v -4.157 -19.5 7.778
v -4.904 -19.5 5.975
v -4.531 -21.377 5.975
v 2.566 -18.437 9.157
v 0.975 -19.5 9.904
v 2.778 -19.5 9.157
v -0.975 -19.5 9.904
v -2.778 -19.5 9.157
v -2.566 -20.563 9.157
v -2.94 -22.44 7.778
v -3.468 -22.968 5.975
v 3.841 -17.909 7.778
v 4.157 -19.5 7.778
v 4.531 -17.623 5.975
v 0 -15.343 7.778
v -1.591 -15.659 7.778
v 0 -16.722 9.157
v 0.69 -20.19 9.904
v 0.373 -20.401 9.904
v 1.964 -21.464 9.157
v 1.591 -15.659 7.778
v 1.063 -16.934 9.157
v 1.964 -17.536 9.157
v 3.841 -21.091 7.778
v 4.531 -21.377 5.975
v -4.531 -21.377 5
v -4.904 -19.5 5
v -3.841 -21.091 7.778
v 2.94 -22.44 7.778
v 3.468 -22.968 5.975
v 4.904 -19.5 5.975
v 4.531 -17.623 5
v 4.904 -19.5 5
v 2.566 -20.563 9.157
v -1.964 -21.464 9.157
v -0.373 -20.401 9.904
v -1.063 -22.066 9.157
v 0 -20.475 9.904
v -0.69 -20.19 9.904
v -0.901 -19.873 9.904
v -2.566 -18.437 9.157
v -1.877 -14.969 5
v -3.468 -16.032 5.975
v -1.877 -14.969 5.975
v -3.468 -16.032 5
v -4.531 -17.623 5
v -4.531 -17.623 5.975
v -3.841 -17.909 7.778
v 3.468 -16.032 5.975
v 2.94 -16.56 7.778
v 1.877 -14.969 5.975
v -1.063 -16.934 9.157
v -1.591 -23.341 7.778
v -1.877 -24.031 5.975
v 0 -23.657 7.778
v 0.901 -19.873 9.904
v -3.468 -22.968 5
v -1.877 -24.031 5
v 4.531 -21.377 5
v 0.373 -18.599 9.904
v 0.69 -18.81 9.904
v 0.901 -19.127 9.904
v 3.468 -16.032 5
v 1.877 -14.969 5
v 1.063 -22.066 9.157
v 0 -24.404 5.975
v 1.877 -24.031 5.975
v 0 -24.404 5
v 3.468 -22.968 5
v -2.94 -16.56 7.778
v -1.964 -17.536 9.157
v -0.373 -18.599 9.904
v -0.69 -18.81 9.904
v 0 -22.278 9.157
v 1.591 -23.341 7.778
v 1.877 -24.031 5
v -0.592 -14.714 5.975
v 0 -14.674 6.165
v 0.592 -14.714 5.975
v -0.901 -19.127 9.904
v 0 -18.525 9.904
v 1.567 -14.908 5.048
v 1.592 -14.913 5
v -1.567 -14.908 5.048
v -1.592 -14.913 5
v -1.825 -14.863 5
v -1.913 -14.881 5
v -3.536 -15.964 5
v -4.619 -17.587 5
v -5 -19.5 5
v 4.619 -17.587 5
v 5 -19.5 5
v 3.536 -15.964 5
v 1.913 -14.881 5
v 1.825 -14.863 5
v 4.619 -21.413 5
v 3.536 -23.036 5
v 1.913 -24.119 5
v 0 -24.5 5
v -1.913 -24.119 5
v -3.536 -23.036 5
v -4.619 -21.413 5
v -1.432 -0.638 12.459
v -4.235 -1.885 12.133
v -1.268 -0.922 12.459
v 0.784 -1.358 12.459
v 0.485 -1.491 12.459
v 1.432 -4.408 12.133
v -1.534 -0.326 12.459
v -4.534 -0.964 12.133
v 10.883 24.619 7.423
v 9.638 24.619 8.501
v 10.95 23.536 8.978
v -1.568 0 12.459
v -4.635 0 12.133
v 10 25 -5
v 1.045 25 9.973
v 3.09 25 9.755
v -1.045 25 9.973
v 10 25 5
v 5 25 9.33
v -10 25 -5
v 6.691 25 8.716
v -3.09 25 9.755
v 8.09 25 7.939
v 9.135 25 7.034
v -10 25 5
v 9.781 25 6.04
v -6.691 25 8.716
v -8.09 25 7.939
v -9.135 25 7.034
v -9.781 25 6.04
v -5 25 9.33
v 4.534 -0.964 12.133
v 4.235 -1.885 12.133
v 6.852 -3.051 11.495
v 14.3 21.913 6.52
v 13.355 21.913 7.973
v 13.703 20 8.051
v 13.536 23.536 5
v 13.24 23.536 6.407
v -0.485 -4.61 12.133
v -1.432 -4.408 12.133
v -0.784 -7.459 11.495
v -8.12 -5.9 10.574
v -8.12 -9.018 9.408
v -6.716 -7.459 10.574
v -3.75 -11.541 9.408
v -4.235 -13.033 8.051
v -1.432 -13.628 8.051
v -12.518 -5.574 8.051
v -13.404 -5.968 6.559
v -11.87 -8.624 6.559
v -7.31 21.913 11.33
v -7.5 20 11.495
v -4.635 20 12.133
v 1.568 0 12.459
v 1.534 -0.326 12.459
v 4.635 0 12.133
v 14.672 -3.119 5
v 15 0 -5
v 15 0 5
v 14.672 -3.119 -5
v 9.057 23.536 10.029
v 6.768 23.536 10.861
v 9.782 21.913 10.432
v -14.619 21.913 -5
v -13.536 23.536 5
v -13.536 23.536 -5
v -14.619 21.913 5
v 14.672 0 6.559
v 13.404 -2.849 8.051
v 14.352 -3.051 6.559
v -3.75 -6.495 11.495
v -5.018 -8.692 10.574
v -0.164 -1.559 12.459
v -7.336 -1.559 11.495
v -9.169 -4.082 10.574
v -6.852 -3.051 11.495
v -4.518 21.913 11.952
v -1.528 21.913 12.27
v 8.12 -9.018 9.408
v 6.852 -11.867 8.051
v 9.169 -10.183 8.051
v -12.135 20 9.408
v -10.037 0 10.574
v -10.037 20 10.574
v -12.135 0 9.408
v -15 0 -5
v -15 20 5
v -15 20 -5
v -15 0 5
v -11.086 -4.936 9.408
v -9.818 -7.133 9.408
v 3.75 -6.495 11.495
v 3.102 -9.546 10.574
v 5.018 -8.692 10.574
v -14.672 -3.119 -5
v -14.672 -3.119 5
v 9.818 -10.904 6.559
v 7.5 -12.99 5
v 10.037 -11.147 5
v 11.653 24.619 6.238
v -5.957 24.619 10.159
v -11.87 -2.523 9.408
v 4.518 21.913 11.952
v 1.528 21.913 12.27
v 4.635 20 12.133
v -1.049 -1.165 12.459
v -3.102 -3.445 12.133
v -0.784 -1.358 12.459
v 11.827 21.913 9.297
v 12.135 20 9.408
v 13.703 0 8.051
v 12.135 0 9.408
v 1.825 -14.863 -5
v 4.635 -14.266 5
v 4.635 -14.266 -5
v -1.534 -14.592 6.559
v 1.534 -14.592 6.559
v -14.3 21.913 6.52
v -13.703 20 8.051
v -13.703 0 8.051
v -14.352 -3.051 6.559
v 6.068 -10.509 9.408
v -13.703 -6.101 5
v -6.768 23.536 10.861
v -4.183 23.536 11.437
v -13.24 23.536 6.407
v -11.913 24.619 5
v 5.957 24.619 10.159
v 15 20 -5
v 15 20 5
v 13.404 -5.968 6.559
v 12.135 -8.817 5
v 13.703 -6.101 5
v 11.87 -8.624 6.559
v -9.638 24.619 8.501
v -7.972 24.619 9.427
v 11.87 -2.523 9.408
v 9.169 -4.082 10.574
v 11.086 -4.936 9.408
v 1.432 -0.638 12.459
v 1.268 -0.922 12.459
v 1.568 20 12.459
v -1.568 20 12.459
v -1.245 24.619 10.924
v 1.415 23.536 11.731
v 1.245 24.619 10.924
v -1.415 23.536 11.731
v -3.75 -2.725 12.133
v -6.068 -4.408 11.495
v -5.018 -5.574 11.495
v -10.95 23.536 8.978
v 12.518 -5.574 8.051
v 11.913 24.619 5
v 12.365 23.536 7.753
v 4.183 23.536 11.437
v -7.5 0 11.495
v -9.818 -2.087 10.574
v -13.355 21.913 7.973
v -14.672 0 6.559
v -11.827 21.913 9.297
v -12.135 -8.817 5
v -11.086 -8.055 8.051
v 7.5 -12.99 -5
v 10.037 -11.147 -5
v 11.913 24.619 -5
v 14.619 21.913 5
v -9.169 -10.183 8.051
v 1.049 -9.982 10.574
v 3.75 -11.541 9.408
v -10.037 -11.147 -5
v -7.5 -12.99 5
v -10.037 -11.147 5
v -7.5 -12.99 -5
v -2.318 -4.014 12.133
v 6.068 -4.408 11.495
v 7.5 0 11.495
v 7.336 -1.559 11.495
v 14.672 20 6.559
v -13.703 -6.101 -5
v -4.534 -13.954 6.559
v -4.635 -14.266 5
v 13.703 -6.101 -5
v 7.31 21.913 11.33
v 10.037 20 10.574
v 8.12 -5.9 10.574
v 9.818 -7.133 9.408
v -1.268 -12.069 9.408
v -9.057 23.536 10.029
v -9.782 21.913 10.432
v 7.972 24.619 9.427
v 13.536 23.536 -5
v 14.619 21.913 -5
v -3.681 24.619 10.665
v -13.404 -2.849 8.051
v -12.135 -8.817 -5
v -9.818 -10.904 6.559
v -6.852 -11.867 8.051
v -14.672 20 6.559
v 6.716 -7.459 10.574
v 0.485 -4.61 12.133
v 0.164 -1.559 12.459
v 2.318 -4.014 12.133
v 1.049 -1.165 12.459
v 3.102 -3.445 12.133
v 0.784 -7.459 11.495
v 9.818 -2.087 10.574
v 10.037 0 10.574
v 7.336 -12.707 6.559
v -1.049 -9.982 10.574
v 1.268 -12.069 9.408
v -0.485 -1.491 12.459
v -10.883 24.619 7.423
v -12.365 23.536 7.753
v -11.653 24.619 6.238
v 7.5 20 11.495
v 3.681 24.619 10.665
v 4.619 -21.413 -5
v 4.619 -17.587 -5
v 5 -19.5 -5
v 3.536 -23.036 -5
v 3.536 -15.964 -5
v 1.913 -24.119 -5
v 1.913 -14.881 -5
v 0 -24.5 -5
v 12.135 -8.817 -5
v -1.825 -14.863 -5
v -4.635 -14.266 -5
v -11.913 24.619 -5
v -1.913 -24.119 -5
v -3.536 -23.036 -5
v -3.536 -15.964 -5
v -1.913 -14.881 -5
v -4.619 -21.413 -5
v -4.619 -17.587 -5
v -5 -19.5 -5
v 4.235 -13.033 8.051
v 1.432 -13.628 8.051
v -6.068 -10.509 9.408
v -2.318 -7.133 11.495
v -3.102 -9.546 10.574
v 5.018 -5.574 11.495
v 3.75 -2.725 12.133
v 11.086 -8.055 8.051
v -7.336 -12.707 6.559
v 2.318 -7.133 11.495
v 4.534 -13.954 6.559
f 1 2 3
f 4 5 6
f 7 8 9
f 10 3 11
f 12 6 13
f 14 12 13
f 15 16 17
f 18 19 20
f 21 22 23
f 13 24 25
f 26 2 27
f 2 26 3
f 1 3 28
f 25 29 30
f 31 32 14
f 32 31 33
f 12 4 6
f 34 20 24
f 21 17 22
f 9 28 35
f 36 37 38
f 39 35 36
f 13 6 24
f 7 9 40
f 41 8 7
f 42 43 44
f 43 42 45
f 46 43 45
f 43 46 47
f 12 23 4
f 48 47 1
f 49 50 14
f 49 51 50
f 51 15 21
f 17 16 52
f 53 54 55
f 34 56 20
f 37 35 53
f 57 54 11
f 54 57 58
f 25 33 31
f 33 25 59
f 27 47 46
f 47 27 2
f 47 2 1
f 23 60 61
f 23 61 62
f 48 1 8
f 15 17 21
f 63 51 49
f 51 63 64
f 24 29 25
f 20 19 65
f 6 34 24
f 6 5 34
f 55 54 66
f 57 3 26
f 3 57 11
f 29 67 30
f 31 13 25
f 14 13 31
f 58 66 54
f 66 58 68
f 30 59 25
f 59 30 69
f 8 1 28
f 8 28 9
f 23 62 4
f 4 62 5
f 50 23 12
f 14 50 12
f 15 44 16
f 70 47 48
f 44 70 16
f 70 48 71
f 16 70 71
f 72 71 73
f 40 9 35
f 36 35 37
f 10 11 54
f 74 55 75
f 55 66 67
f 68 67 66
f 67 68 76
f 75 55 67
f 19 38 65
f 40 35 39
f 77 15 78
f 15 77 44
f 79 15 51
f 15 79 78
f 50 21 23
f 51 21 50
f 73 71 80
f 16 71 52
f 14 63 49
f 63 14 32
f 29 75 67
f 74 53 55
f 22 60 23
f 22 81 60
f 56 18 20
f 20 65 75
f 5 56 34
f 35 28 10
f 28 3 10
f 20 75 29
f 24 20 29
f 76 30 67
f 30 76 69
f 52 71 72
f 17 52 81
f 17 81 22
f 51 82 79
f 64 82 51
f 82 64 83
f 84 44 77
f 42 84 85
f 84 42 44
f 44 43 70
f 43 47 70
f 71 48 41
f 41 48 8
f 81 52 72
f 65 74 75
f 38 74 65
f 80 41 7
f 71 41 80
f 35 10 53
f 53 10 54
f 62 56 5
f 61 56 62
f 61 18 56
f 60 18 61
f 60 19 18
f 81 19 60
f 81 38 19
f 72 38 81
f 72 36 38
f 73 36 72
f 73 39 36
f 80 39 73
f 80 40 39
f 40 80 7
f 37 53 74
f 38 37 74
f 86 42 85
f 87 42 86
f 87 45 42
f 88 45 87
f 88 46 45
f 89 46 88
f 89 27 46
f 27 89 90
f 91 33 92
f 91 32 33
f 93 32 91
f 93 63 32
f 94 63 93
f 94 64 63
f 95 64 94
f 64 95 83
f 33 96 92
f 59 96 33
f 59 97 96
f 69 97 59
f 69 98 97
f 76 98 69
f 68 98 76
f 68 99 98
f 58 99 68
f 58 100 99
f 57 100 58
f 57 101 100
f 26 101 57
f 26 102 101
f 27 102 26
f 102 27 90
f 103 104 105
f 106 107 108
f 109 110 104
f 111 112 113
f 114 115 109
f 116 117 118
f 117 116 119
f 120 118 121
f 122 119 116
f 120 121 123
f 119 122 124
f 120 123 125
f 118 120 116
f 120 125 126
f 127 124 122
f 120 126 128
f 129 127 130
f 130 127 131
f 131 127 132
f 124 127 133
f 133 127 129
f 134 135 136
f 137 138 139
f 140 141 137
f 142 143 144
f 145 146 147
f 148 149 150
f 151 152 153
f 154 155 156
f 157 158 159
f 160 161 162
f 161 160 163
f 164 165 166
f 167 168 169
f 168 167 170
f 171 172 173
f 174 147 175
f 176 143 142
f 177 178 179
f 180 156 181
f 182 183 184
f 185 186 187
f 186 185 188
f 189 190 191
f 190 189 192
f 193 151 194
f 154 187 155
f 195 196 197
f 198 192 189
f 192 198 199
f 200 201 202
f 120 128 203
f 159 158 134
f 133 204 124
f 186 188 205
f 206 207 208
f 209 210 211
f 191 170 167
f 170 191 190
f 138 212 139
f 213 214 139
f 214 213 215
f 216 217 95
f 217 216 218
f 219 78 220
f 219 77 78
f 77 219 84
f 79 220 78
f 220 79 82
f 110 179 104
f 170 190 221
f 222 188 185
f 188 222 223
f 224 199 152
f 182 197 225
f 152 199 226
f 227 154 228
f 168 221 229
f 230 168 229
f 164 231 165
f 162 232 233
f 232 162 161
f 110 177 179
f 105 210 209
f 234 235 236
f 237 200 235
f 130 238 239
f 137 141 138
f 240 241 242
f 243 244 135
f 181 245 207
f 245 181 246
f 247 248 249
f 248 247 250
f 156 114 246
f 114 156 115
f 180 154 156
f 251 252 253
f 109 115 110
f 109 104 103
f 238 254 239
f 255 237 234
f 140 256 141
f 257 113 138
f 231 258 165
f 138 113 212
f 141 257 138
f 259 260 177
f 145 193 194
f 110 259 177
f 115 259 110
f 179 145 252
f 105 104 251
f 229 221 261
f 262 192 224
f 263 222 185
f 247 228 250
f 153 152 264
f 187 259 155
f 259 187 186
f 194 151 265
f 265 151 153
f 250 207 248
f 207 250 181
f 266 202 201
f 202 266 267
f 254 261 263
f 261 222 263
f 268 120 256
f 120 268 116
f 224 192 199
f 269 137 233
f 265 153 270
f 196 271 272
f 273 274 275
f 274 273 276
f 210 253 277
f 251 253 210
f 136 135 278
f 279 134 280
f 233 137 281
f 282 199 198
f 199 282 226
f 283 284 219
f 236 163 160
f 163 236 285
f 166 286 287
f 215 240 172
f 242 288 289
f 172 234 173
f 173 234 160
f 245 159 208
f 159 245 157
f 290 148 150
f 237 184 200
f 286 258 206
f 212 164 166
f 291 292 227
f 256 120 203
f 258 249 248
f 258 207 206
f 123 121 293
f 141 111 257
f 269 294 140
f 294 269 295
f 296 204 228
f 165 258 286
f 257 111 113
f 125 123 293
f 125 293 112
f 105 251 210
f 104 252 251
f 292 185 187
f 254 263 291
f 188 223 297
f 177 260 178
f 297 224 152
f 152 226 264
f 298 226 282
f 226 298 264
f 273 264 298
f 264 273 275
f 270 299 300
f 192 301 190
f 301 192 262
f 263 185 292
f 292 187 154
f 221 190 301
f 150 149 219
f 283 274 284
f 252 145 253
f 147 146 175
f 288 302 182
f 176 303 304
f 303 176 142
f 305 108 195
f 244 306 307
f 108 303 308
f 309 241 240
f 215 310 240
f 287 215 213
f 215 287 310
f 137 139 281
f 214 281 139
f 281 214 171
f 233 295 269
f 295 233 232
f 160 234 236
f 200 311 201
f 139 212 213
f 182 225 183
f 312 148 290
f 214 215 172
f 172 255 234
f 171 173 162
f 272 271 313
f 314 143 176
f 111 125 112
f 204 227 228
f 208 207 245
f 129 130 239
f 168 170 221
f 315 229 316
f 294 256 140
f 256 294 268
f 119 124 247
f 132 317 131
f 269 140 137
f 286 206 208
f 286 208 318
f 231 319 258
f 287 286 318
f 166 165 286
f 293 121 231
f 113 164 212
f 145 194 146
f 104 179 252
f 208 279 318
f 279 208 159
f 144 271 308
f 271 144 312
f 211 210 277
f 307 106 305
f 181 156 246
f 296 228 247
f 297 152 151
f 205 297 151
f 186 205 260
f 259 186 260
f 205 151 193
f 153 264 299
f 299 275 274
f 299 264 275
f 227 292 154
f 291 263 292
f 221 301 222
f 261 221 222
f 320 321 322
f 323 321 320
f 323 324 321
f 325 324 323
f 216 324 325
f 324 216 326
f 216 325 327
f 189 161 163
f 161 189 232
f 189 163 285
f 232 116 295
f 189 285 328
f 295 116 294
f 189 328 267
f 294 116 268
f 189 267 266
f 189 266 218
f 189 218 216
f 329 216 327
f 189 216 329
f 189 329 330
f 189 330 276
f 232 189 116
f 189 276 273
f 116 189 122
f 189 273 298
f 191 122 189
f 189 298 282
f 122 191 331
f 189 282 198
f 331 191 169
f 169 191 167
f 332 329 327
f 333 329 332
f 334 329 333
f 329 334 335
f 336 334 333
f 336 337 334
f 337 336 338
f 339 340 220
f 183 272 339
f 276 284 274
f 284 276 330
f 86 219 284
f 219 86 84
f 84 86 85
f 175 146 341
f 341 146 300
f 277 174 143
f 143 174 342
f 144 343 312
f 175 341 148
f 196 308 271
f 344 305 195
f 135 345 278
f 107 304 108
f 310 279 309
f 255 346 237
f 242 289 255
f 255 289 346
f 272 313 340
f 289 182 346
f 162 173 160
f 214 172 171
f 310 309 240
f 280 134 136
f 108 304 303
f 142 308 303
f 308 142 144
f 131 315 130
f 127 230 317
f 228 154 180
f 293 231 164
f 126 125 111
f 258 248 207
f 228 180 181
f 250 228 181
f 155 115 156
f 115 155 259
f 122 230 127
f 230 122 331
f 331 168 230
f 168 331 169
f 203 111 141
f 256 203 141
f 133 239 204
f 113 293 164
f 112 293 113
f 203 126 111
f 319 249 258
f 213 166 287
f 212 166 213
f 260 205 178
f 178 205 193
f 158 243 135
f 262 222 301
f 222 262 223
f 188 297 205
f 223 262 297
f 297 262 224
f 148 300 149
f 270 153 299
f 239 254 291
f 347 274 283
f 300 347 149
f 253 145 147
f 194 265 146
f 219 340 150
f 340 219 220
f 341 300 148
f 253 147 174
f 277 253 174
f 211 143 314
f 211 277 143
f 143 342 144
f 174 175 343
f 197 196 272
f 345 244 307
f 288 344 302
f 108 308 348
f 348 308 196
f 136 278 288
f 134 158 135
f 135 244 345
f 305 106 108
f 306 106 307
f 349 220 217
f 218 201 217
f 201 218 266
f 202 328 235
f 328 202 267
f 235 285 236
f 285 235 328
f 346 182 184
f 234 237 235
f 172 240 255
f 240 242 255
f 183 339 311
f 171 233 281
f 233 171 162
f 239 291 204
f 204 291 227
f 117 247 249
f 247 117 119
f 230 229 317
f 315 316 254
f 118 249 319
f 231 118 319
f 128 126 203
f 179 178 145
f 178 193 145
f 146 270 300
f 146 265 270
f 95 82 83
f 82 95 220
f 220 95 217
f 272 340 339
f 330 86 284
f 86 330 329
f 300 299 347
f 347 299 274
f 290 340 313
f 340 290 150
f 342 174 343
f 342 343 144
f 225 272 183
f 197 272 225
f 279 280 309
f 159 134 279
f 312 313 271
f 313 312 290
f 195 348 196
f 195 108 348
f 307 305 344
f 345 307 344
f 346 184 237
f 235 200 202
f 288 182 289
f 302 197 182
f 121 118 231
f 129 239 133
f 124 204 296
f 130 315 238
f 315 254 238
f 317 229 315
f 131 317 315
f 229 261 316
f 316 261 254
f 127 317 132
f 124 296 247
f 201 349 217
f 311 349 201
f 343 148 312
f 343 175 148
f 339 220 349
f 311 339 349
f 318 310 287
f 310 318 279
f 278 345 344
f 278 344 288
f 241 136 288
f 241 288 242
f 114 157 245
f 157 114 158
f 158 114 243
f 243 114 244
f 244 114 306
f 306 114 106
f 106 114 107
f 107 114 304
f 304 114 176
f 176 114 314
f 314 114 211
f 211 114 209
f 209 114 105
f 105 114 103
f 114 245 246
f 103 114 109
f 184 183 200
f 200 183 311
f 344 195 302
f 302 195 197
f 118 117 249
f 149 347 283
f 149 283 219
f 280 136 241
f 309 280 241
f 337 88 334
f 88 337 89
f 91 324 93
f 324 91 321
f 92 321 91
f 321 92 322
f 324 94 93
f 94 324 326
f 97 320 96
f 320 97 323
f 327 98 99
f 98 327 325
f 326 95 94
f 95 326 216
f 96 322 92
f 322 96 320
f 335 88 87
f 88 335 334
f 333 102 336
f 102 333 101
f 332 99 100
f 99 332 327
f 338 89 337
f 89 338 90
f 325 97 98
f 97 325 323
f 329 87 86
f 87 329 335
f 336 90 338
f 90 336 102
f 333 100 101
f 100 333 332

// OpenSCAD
use <MCAD/regular_shapes.scad>

w = 30;
l = 35;
h = 10;

r = w/2;
r0 = 5;
not_r = w/6;
not_overlap = 0.1;

module hemisphere(r=r){
    intersection(){
        sphere(r, center=true);
        translate([0, 0, 1.5*r])
        cube([3*r, 3*r, 3*r], center=true);
    }
}

module hemitorus(r=r, r0=r0){
    intersection(){
        rotate([90, 0, 0])
        torus2(r-r0, r0);
        translate([0, 0, 1.5*r])
        cube([3*r, 3*r, 3*r], center=true);
    }
}

hull(){
    translate([0, (l-r)/2, 0])
    cube([w, l-r-r0, h], center=true);
    cylinder(h, r, r, center=true);


    translate([0, 0, h/2])
    scale([1, 1, 0.5])
    {
        translate([0, 0, 0])
        hemisphere();
        translate([0, l-r, 0])
        scale([1, 1, 1])
        hemitorus();
    }
    
    translate([0, l-r, -h/2])
    scale([1, 1, 0.5])
    hemitorus();
}

translate([0, -r - not_r*(1-not_overlap), 0])
cylinder(h, not_r, not_r, center=true);
translate([0, -r-not_r*(1-not_overlap), h/2])
hemisphere(not_r);
